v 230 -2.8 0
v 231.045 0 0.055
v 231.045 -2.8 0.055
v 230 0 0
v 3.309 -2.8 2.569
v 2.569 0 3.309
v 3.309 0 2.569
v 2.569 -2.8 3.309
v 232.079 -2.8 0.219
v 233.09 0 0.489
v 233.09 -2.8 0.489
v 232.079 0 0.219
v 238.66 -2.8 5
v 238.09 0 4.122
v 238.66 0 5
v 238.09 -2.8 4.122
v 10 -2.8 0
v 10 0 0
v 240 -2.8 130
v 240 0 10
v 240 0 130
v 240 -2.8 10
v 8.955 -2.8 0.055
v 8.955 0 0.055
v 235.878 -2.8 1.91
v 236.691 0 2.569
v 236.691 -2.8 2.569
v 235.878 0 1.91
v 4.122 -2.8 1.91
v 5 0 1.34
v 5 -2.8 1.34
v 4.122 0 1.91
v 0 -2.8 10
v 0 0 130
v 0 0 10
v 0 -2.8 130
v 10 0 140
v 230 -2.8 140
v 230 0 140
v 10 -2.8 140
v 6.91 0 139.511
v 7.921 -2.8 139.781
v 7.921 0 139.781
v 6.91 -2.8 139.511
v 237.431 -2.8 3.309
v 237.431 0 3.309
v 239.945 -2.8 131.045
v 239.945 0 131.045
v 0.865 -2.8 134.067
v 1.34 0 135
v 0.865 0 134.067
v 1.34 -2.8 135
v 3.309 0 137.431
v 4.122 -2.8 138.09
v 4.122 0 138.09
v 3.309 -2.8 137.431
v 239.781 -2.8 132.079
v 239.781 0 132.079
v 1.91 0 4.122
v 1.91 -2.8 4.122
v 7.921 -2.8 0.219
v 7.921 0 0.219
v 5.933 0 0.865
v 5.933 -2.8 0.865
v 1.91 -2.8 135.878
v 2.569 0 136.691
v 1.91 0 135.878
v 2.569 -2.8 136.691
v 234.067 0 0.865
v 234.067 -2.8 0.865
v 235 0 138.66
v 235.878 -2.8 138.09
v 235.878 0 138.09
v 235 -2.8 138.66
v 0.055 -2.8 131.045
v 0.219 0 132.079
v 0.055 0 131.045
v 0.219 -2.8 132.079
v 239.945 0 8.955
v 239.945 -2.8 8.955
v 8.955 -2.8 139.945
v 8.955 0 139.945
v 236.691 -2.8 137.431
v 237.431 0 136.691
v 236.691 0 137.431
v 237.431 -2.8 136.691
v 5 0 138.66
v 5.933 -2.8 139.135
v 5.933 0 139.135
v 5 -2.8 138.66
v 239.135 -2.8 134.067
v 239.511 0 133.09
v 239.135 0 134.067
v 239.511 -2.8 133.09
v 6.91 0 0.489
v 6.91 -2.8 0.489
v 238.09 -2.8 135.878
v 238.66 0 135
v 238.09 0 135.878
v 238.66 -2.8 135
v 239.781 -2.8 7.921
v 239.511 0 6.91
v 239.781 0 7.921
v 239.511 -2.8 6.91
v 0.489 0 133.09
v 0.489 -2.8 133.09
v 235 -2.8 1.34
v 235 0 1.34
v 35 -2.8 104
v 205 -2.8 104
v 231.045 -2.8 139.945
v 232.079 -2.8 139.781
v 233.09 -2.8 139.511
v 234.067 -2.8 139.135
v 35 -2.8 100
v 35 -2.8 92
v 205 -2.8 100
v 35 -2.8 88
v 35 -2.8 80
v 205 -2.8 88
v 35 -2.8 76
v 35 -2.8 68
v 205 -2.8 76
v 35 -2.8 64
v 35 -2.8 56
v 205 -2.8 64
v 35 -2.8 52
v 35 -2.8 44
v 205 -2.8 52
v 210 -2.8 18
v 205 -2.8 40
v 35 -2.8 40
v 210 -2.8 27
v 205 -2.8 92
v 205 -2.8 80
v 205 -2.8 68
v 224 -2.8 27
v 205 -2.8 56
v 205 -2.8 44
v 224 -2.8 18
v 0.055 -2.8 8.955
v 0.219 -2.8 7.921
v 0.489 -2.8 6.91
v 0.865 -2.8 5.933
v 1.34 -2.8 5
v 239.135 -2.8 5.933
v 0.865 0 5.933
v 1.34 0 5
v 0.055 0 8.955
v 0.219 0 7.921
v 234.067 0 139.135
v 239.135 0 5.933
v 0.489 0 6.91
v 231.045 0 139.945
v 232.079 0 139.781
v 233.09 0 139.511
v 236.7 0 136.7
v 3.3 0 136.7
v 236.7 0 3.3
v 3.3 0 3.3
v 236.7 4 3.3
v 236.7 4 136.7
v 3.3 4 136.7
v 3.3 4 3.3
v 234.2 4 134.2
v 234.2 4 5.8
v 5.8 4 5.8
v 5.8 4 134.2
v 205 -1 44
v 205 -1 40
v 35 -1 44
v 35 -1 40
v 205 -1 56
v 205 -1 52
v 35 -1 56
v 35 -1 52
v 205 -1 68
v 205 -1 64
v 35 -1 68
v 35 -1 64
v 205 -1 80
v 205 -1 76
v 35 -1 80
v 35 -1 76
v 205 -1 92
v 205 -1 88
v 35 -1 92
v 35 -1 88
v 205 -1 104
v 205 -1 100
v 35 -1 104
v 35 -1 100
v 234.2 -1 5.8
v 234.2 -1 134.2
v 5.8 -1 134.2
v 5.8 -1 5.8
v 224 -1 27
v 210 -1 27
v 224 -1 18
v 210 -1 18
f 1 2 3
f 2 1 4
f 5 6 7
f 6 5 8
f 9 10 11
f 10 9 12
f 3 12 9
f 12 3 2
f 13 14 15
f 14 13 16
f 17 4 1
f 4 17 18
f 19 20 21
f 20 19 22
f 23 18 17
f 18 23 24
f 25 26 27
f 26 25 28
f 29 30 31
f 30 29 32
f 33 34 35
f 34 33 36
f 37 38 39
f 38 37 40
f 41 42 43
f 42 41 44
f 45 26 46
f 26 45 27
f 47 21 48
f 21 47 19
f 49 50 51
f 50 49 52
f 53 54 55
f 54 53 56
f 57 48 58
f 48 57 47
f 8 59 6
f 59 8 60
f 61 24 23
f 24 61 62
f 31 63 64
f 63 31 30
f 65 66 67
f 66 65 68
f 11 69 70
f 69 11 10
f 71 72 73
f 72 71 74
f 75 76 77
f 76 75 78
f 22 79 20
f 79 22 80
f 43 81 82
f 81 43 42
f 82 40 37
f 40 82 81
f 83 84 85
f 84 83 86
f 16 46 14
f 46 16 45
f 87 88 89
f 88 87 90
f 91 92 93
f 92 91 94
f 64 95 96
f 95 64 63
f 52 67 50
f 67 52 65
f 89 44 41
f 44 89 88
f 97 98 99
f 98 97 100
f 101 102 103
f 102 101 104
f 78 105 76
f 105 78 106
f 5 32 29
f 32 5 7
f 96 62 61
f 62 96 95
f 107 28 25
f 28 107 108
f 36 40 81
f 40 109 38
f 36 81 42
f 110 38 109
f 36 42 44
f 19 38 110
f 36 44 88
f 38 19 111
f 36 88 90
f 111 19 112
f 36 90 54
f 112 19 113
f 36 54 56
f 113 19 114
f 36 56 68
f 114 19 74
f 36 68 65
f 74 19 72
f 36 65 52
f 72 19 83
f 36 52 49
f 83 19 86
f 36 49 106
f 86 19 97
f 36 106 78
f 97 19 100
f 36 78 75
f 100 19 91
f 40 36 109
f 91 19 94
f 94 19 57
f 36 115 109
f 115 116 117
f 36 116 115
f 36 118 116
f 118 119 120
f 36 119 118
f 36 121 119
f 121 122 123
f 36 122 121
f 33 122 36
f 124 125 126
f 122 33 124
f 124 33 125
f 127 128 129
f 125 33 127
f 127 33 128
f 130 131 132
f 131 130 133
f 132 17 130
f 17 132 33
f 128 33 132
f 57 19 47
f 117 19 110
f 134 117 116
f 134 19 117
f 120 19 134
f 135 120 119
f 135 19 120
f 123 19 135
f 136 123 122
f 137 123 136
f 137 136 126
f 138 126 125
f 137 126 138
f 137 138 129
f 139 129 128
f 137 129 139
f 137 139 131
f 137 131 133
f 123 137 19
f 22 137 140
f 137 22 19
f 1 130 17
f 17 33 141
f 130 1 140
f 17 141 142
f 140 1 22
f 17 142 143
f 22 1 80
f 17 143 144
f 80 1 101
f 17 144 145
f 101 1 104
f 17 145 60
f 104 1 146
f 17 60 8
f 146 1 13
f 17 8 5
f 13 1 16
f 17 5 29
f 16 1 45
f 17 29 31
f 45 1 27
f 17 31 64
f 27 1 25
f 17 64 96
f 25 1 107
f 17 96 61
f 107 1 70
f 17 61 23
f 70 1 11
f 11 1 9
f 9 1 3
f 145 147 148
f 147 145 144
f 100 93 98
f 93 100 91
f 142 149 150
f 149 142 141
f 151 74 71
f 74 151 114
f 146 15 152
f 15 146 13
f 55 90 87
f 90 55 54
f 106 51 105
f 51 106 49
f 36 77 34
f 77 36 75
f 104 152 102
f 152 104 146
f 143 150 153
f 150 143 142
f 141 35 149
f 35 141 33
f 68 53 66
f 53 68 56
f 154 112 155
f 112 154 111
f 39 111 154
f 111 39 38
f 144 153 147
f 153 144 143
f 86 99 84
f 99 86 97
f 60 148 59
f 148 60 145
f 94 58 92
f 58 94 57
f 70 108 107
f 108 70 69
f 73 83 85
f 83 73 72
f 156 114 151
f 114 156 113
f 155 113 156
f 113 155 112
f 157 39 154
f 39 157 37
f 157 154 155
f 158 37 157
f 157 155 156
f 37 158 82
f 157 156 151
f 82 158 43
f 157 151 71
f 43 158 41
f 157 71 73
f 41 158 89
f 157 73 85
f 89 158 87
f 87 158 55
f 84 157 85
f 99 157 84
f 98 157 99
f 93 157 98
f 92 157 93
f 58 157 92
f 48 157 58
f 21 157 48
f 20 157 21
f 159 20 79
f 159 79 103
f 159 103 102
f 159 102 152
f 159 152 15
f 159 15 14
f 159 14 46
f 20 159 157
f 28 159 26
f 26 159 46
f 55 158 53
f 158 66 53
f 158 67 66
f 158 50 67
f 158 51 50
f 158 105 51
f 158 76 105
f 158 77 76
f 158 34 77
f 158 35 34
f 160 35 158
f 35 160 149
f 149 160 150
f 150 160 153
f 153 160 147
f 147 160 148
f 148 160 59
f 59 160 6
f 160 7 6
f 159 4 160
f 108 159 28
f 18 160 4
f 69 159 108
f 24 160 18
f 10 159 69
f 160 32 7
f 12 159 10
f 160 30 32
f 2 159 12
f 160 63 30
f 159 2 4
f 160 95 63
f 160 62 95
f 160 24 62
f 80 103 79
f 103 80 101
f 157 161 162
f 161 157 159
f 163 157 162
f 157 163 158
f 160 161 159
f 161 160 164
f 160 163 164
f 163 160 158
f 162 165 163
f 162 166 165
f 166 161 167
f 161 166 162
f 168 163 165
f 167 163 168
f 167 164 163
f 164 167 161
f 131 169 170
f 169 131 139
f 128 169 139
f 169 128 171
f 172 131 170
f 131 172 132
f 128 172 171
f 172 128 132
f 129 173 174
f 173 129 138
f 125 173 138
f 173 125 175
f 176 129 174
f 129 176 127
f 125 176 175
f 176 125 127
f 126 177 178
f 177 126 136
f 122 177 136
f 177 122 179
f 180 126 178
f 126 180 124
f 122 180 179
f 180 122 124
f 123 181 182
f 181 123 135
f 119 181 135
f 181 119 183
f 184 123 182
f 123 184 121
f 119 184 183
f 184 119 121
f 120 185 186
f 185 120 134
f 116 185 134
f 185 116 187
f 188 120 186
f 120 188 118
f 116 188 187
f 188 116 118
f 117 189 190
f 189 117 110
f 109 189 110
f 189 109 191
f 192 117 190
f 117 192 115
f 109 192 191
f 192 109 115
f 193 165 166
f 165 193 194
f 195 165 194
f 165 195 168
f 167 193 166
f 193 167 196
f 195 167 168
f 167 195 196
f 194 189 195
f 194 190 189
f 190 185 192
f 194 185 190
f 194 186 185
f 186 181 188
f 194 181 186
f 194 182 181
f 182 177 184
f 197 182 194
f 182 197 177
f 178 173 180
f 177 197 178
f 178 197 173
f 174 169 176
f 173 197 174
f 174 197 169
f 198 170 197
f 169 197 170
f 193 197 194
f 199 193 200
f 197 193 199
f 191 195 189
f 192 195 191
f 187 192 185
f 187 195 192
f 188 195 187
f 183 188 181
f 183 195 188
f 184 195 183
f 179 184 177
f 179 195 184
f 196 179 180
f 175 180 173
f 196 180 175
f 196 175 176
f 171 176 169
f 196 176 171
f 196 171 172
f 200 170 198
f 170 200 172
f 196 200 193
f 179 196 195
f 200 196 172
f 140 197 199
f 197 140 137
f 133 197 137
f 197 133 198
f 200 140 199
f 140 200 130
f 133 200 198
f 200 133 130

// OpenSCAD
// file: utils.scad
// utils.scad - Reusable 3D Geometry Modules

include <config.scad>

// 3D Rounded Box with Spherical Fillets
module rounded_box(w, d, h, r) {
    hull() {
        translate([r, r, r]) sphere(r);
        translate([w - r, r, r]) sphere(r);
        translate([r, d - r, r]) sphere(r);
        translate([w - r, d - r, r]) sphere(r);
        translate([r, r, h - r]) sphere(r);
        translate([w - r, r, h - r]) sphere(r);
        translate([r, d - r, h - r]) sphere(r);
        translate([w - r, d - r, h - r]) sphere(r);
    }
}

// 2D Rounded Plate Extrusion
module rounded_plate(w, h, thickness, r) {
    linear_extrude(height = thickness)
        offset(r = r) offset(delta = -r) square([w, h]);
}

// 4-Corner Standoff Array
module standoff_block(x, y, w, d, standoff_h, hole_d = 2.4, boss_d = 6) {
    margin = 4;
    for (dx = [margin, w - margin])
        for (dy = [margin, d - margin])
            translate([x + dx, y + dy, wall])
                difference() {
                    cylinder(d = boss_d, h = standoff_h);
                    translate([0, 0, -0.1])
                        cylinder(d = hole_d, h = standoff_h + 0.2);
                }
}
// file: config.scad
// config.scad - Shared Dimensions & Configuration

$fn = 60;

// ENCLOSURE DIMENSIONS (mm)
box_w = 240;   // Width (X)
box_d = 145;   // Depth (Y)
box_h = 140;   // Height (Z)
wall  = 2.8;   // Wall thickness
corner_r = 10; // Vintage rounded corner radius

// PREVIEW COLOR
wood_color = [0.35, 0.20, 0.10];

// SPEAKER BAY
spk_hole_dia   = 80;   // Front sound cutout
spk_bay_dia    = 112;  // Internal clearance
spk_bay_depth  = 100;
spk_x = 62.5;
spk_z = box_h / 2;

// 1602 LCD WINDOW
lcd_win_w = 72;
lcd_win_h = 25;
lcd_x     = 180;
lcd_z     = 105;

// CONTROLS
pot_x     = 155;
pot_z     = 35;
pot_hole  = 7.2;

btn_x     = 205;
btn_z     = 35;

// Button plunger & guide sleeve
btn_cap_dia           = 10;
btn_cap_recess_depth  = 1.6;
btn_shaft_hole_dia    = 4.6;
btn_sleeve_od         = 8.0;
btn_sleeve_len        = 6.0;
btn_switch_pad_w      = 8.0;
btn_switch_pad_d      = 8.0;
btn_switch_standoff_h = 8.0;

btn_plunger_shaft_len = 14;
btn_plunger_shaft_dia = 4.2;
btn_plunger_cap_h     = 1.4;

// REAR POWER CUTOUT (USB-C)
pwr_w = 14;
pwr_h = 9;
pwr_z = 18;

// INTERNAL MOUNTING STANDOFFS
// Raspberry Pi
pi_x = 8;
pi_y = 103;
pi_w = 110;
pi_d = 35;

// Arduino
ard_x = 150;
ard_y = 80;
ard_w = 65;
ard_d = 50;
ard_standoff_h = 5;

// USB Hub
hub_x = 130;
hub_y = 40;
hub_w = 100;
hub_d = 30;
hub_riser_h = 20;
// main file
 // back_lid.scad - Rear Panel with Vents & USB Cutout

include <config.scad>
include <utils.scad>

module radio_back_lid() {
    difference() {
        union() {
            // Main back plate
            rotate([90, 0, 0])
                rounded_plate(box_w, box_h, wall, corner_r);

            // Inset snap lip
            translate([wall + 0.5, 0, wall + 0.5])
                cube([box_w - 2*wall - 1, 4, box_h - 2*wall - 1]);
        }

        // Hollow out lip interior
        translate([wall + 3, -1, wall + 3])
            cube([box_w - 2*wall - 6, 6, box_h - 2*wall - 6]);

        // USB-C Power cutout
        translate([box_w - 30, -wall - 2, pwr_z])
            cube([pwr_w, wall * 4, pwr_h]);

        // Ventilation slots
        for (vz = [40 : 12 : box_h - 30])
            translate([35, -wall - 2, vz])
                cube([box_w - 70, wall * 4, 4]);
    }
}

// Render self when opened directly
color(wood_color) radio_back_lid();
